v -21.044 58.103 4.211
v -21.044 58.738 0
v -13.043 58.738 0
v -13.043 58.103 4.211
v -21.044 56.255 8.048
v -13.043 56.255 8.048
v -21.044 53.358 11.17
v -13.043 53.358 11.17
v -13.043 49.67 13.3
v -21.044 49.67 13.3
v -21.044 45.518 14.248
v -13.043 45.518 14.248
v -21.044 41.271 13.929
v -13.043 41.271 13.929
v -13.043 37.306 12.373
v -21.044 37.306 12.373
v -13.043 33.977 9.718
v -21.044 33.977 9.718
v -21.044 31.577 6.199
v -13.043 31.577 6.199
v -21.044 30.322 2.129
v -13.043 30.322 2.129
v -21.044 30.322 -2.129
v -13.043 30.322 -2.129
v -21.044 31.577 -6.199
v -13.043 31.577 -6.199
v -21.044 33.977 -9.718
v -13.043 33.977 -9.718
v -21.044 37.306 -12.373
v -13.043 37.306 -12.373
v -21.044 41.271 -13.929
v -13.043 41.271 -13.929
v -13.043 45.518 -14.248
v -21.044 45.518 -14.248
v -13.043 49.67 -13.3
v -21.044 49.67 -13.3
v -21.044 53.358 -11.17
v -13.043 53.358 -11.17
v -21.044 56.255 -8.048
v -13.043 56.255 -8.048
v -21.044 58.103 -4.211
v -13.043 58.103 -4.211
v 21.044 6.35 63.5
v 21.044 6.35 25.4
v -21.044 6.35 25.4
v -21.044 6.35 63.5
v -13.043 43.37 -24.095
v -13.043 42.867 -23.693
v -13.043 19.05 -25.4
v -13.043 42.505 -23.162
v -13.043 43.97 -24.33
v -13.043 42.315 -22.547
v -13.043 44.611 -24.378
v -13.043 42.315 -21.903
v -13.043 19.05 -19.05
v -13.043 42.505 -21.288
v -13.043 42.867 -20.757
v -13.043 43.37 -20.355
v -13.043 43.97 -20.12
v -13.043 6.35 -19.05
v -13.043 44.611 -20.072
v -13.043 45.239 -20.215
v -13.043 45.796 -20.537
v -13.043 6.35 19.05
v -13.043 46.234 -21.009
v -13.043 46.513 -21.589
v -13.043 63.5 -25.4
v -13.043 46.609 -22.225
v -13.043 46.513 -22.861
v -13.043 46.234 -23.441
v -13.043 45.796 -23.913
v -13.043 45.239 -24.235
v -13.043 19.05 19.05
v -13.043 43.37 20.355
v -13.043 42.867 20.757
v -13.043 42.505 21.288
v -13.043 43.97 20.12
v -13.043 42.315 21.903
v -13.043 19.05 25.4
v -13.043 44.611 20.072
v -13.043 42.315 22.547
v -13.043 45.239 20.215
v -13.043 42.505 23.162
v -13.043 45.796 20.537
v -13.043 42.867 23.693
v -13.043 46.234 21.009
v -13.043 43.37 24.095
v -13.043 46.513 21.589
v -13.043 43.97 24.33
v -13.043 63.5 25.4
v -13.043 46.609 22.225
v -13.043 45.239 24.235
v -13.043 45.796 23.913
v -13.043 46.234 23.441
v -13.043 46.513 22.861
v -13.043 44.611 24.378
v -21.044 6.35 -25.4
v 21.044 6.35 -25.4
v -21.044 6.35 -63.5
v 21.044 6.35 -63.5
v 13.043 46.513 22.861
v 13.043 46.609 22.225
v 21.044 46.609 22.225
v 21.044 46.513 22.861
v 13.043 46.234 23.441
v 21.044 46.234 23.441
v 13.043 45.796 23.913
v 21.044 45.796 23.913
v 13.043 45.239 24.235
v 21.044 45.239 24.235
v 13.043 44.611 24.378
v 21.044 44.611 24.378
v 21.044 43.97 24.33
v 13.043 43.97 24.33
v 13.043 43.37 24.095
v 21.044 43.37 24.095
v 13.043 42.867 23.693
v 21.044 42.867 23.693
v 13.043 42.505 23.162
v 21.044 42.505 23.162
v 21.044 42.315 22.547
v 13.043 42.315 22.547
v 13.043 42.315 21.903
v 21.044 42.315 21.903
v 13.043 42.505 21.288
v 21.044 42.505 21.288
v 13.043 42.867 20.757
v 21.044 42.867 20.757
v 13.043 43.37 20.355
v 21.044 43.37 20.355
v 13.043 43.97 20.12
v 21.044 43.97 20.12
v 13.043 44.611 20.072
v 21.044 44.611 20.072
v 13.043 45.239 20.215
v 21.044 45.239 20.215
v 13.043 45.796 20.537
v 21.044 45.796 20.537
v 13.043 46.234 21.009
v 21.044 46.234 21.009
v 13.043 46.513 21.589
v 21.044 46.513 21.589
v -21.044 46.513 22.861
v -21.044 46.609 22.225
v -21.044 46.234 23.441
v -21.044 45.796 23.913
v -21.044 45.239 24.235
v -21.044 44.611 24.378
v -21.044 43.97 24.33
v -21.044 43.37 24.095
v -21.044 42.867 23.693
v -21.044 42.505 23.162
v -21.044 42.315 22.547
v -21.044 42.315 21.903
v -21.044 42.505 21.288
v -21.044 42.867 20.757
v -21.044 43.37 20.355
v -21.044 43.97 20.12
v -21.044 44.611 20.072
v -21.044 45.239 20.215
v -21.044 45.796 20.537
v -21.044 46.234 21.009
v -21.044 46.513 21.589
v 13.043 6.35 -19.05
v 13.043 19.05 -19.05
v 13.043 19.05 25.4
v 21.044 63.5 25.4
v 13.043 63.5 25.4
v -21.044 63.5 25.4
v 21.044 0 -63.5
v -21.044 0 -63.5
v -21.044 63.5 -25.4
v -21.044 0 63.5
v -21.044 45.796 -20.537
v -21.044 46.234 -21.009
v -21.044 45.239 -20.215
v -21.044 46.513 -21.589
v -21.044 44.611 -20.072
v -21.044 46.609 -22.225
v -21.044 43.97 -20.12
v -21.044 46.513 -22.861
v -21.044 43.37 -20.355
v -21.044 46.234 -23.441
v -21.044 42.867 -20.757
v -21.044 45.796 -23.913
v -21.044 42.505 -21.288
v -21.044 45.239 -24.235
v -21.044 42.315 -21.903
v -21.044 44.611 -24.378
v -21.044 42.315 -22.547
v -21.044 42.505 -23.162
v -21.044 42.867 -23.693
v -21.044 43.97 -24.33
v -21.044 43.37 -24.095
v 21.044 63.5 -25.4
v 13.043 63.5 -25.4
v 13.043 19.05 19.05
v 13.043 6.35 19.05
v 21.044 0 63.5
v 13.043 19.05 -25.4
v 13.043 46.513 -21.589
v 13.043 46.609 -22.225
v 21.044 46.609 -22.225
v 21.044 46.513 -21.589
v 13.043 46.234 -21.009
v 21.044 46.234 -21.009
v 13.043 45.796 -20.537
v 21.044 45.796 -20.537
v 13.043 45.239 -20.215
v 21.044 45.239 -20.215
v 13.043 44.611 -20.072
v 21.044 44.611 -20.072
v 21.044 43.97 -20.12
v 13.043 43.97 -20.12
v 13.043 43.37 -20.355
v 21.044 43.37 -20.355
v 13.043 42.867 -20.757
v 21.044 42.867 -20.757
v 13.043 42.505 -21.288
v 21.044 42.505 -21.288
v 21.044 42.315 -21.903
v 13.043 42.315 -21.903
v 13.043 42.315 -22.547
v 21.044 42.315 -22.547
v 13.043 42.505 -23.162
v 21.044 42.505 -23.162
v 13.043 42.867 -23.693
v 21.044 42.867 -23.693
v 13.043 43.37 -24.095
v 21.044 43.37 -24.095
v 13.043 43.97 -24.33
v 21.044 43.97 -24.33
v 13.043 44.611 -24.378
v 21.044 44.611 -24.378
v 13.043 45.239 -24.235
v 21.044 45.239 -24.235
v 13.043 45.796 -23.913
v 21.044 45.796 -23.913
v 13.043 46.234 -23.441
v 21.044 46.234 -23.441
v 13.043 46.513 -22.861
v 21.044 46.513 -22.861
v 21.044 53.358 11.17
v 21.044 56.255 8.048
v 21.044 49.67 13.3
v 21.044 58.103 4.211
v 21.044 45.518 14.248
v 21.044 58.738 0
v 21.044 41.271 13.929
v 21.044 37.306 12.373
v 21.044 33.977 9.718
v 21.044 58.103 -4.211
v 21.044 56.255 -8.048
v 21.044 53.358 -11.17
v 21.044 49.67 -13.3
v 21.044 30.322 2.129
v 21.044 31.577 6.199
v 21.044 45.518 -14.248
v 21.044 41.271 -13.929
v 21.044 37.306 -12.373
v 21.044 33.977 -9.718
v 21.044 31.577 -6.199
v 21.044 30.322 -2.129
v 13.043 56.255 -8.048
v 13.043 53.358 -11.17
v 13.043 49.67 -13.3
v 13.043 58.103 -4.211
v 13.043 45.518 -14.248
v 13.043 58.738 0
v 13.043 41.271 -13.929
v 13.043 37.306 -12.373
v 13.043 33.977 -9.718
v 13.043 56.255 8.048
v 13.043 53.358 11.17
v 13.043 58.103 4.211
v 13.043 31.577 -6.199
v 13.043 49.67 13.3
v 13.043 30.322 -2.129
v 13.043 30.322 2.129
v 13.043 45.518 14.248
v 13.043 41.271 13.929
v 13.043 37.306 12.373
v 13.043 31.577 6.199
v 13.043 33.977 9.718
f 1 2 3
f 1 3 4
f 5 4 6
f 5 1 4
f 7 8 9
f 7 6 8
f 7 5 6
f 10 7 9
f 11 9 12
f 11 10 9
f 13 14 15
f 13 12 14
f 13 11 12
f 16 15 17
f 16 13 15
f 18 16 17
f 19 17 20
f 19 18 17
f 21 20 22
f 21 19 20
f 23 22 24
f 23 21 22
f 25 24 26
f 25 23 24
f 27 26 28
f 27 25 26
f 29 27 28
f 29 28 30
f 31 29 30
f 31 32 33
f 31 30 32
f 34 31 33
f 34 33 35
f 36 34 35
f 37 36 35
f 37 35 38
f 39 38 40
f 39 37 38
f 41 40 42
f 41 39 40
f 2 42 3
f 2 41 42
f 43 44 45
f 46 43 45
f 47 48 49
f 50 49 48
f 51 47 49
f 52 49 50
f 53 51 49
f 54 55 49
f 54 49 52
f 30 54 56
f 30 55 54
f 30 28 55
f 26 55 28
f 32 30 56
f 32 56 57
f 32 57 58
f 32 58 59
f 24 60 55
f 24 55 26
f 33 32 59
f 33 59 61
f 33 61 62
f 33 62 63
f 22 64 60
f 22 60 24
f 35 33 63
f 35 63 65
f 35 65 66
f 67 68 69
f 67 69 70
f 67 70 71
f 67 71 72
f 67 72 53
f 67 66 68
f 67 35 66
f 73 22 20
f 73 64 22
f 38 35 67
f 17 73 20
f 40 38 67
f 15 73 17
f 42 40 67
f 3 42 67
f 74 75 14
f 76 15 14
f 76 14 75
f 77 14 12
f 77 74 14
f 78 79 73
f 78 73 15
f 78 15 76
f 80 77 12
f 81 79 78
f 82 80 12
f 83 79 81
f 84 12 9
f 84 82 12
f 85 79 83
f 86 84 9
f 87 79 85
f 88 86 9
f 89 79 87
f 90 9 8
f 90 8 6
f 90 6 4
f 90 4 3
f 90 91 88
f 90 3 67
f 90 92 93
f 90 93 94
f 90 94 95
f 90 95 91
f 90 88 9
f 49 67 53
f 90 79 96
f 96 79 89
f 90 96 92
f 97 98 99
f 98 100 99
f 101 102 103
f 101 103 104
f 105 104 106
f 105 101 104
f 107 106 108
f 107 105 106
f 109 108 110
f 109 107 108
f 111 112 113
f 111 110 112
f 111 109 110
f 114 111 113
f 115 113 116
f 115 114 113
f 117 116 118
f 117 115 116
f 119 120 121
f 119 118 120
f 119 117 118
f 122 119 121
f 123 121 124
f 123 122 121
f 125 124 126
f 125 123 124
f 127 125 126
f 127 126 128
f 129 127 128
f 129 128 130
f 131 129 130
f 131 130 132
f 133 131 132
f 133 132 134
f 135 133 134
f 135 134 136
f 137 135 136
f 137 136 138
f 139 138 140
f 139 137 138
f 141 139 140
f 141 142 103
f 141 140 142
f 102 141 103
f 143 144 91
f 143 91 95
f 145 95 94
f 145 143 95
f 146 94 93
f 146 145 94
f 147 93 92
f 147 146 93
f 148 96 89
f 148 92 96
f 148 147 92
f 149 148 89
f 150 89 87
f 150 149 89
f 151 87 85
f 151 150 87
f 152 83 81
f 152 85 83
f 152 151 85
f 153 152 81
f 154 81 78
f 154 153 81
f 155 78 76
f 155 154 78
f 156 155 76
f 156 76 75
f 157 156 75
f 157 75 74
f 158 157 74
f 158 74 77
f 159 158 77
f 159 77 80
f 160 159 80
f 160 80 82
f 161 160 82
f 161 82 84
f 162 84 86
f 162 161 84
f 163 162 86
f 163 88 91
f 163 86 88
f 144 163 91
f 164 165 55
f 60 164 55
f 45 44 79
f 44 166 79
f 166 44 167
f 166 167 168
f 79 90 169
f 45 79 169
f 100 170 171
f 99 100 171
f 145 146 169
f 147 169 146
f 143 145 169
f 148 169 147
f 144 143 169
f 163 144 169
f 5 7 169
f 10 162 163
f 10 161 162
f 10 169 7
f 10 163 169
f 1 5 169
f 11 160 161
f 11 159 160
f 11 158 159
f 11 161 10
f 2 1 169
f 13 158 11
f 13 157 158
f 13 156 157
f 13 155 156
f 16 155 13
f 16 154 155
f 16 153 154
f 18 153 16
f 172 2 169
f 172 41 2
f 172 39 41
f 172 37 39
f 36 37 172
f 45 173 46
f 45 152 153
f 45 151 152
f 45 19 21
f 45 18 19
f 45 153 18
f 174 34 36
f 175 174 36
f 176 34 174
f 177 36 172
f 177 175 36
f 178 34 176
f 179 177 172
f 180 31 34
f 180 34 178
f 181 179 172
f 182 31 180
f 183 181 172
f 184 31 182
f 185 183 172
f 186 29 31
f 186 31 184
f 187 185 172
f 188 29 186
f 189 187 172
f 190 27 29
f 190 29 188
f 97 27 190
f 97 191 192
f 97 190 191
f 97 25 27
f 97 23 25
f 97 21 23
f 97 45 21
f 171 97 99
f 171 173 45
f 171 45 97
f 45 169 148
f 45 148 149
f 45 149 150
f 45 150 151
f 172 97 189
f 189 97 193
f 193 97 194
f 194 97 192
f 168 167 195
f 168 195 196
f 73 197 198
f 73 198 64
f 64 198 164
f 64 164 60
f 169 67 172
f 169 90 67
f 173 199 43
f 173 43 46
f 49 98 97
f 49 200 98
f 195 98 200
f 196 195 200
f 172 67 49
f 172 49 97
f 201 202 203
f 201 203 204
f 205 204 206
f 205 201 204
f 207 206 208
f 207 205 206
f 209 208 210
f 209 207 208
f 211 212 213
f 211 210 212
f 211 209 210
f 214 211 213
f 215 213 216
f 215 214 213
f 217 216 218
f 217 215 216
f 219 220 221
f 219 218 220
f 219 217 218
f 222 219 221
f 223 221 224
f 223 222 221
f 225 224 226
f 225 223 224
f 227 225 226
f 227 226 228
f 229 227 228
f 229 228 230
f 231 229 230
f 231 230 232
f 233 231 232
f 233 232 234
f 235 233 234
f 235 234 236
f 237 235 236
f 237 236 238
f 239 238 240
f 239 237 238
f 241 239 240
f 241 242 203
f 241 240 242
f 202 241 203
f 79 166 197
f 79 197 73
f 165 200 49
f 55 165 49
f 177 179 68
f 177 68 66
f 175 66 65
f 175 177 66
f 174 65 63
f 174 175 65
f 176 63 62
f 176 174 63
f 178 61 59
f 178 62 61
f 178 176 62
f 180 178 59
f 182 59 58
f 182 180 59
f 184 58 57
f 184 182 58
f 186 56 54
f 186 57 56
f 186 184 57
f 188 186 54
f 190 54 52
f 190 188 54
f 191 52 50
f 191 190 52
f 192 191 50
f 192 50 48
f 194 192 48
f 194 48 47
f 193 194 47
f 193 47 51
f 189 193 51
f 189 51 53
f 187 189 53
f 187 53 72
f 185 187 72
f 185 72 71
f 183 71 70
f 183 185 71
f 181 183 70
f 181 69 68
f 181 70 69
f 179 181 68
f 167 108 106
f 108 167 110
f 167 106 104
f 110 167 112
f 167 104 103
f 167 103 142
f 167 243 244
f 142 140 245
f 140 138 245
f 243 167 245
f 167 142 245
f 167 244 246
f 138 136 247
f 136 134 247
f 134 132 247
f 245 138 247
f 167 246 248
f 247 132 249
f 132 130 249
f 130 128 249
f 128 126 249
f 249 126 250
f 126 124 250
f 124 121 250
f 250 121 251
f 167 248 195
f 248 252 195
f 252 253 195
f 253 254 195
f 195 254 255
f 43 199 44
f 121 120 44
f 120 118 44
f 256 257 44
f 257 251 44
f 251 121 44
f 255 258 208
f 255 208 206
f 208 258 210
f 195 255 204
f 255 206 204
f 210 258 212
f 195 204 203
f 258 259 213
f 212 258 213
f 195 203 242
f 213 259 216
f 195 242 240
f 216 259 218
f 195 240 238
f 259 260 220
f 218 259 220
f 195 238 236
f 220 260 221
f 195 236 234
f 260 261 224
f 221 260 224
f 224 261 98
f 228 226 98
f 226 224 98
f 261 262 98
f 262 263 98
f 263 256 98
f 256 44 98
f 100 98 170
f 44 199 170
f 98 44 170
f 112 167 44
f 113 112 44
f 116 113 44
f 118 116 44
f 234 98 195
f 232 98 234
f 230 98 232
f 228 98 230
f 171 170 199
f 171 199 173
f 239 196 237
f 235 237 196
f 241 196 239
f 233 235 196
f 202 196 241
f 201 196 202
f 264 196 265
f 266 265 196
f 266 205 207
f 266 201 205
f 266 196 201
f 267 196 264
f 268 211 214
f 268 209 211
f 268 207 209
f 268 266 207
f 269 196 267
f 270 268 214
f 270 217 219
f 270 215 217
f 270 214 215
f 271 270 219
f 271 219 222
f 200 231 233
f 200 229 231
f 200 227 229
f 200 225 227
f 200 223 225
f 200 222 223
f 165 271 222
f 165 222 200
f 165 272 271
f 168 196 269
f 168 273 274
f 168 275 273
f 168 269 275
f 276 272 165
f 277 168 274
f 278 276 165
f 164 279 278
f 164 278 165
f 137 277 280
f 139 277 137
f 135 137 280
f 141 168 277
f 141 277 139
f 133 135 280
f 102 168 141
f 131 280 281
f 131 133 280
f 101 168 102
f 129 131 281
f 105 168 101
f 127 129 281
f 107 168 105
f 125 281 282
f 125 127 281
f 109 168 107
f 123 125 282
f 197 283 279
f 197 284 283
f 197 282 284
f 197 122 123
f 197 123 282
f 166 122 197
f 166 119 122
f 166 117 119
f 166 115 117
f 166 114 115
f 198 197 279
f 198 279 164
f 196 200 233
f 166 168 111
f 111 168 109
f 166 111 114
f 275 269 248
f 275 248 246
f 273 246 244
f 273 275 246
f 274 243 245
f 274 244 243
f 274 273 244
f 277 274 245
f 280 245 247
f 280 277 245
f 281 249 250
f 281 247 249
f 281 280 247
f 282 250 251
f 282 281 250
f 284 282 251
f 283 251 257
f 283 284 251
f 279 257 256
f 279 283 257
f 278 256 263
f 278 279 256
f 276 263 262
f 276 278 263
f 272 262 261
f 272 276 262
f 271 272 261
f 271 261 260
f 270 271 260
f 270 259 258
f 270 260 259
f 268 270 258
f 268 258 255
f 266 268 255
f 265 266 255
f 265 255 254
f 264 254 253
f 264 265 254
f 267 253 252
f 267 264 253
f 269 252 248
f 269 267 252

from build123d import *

# Parameters (mm, degrees)
BOSS_EXTRUDE1_DEPTH     = 25.4
CUT_EXTRUDE1_DEPTH      = 81.304376648
CUT_EXTRUDE1_DEPTH_BACK = 81.304376648
SKETCH2_R               = 14.2875
SKETCH2_R_2             = 2.159
SKETCH3_W               = 42.0878
SKETCH3_H               = 127
BOSS_EXTRUDE2_DEPTH     = 6.35
SKETCH4_W               = 26.0858
SKETCH4_H               = 12.7
BOSS_EXTRUDE3_DEPTH     = 6.35


with BuildPart() as part:
    # Sketch1 → Boss-Extrude1 (new, symmetric)
    with BuildSketch(Plane.XY):
        Polygon((-21.0439, 0), (21.0439, 0), (21.0439, 63.5), (13.0429, 63.5), (13.0429, 6.35), (-13.0429, 6.35), (-13.0429, 63.5), (-21.0439, 63.5), align=None)
    extrude(amount=BOSS_EXTRUDE1_DEPTH, both=True)

    # Sketch2 → Cut-Extrude1 (cut, two sides: drawn at the far end of the back side and taken through both)
    with BuildSketch(Plane(origin=(21.0439, 0, 0), x_dir=(0, 0, -1), z_dir=(1, 0, 0)).offset(-CUT_EXTRUDE1_DEPTH_BACK)):
        with Locations(Location((0, 44.45, 0), (0, 0, 90))):
            Circle(SKETCH2_R)
        with Locations(Location((22.225, 44.45, 0), (0, 0, 90))):
            Circle(SKETCH2_R_2)
        with Locations(Location((-22.225, 44.45, 0), (0, 0, 90))):
            Circle(SKETCH2_R_2)
    extrude(amount=CUT_EXTRUDE1_DEPTH + CUT_EXTRUDE1_DEPTH_BACK, mode=Mode.SUBTRACT)

    # Sketch3 → Boss-Extrude2 (add)
    with BuildSketch(Plane(origin=(0, 0, 0), x_dir=(-1, 0, 0), z_dir=(0, -1, 0))):
        Rectangle(SKETCH3_W, SKETCH3_H)
    extrude(amount=-BOSS_EXTRUDE2_DEPTH)

    # Sketch4 → Boss-Extrude3 (add)
    with BuildSketch(Plane(origin=(0, 0, -25.4), x_dir=(-1, 0, 0), z_dir=(0, 0, -1))):
        with Locations((0, 12.7)):
            Rectangle(SKETCH4_W, SKETCH4_H)
    boss_extrude3 = extrude(amount=-BOSS_EXTRUDE3_DEPTH)

    # Mirror1: Boss-Extrude3 across plane
    add(boss_extrude3.mirror(Plane.XY))


solid = part.part
